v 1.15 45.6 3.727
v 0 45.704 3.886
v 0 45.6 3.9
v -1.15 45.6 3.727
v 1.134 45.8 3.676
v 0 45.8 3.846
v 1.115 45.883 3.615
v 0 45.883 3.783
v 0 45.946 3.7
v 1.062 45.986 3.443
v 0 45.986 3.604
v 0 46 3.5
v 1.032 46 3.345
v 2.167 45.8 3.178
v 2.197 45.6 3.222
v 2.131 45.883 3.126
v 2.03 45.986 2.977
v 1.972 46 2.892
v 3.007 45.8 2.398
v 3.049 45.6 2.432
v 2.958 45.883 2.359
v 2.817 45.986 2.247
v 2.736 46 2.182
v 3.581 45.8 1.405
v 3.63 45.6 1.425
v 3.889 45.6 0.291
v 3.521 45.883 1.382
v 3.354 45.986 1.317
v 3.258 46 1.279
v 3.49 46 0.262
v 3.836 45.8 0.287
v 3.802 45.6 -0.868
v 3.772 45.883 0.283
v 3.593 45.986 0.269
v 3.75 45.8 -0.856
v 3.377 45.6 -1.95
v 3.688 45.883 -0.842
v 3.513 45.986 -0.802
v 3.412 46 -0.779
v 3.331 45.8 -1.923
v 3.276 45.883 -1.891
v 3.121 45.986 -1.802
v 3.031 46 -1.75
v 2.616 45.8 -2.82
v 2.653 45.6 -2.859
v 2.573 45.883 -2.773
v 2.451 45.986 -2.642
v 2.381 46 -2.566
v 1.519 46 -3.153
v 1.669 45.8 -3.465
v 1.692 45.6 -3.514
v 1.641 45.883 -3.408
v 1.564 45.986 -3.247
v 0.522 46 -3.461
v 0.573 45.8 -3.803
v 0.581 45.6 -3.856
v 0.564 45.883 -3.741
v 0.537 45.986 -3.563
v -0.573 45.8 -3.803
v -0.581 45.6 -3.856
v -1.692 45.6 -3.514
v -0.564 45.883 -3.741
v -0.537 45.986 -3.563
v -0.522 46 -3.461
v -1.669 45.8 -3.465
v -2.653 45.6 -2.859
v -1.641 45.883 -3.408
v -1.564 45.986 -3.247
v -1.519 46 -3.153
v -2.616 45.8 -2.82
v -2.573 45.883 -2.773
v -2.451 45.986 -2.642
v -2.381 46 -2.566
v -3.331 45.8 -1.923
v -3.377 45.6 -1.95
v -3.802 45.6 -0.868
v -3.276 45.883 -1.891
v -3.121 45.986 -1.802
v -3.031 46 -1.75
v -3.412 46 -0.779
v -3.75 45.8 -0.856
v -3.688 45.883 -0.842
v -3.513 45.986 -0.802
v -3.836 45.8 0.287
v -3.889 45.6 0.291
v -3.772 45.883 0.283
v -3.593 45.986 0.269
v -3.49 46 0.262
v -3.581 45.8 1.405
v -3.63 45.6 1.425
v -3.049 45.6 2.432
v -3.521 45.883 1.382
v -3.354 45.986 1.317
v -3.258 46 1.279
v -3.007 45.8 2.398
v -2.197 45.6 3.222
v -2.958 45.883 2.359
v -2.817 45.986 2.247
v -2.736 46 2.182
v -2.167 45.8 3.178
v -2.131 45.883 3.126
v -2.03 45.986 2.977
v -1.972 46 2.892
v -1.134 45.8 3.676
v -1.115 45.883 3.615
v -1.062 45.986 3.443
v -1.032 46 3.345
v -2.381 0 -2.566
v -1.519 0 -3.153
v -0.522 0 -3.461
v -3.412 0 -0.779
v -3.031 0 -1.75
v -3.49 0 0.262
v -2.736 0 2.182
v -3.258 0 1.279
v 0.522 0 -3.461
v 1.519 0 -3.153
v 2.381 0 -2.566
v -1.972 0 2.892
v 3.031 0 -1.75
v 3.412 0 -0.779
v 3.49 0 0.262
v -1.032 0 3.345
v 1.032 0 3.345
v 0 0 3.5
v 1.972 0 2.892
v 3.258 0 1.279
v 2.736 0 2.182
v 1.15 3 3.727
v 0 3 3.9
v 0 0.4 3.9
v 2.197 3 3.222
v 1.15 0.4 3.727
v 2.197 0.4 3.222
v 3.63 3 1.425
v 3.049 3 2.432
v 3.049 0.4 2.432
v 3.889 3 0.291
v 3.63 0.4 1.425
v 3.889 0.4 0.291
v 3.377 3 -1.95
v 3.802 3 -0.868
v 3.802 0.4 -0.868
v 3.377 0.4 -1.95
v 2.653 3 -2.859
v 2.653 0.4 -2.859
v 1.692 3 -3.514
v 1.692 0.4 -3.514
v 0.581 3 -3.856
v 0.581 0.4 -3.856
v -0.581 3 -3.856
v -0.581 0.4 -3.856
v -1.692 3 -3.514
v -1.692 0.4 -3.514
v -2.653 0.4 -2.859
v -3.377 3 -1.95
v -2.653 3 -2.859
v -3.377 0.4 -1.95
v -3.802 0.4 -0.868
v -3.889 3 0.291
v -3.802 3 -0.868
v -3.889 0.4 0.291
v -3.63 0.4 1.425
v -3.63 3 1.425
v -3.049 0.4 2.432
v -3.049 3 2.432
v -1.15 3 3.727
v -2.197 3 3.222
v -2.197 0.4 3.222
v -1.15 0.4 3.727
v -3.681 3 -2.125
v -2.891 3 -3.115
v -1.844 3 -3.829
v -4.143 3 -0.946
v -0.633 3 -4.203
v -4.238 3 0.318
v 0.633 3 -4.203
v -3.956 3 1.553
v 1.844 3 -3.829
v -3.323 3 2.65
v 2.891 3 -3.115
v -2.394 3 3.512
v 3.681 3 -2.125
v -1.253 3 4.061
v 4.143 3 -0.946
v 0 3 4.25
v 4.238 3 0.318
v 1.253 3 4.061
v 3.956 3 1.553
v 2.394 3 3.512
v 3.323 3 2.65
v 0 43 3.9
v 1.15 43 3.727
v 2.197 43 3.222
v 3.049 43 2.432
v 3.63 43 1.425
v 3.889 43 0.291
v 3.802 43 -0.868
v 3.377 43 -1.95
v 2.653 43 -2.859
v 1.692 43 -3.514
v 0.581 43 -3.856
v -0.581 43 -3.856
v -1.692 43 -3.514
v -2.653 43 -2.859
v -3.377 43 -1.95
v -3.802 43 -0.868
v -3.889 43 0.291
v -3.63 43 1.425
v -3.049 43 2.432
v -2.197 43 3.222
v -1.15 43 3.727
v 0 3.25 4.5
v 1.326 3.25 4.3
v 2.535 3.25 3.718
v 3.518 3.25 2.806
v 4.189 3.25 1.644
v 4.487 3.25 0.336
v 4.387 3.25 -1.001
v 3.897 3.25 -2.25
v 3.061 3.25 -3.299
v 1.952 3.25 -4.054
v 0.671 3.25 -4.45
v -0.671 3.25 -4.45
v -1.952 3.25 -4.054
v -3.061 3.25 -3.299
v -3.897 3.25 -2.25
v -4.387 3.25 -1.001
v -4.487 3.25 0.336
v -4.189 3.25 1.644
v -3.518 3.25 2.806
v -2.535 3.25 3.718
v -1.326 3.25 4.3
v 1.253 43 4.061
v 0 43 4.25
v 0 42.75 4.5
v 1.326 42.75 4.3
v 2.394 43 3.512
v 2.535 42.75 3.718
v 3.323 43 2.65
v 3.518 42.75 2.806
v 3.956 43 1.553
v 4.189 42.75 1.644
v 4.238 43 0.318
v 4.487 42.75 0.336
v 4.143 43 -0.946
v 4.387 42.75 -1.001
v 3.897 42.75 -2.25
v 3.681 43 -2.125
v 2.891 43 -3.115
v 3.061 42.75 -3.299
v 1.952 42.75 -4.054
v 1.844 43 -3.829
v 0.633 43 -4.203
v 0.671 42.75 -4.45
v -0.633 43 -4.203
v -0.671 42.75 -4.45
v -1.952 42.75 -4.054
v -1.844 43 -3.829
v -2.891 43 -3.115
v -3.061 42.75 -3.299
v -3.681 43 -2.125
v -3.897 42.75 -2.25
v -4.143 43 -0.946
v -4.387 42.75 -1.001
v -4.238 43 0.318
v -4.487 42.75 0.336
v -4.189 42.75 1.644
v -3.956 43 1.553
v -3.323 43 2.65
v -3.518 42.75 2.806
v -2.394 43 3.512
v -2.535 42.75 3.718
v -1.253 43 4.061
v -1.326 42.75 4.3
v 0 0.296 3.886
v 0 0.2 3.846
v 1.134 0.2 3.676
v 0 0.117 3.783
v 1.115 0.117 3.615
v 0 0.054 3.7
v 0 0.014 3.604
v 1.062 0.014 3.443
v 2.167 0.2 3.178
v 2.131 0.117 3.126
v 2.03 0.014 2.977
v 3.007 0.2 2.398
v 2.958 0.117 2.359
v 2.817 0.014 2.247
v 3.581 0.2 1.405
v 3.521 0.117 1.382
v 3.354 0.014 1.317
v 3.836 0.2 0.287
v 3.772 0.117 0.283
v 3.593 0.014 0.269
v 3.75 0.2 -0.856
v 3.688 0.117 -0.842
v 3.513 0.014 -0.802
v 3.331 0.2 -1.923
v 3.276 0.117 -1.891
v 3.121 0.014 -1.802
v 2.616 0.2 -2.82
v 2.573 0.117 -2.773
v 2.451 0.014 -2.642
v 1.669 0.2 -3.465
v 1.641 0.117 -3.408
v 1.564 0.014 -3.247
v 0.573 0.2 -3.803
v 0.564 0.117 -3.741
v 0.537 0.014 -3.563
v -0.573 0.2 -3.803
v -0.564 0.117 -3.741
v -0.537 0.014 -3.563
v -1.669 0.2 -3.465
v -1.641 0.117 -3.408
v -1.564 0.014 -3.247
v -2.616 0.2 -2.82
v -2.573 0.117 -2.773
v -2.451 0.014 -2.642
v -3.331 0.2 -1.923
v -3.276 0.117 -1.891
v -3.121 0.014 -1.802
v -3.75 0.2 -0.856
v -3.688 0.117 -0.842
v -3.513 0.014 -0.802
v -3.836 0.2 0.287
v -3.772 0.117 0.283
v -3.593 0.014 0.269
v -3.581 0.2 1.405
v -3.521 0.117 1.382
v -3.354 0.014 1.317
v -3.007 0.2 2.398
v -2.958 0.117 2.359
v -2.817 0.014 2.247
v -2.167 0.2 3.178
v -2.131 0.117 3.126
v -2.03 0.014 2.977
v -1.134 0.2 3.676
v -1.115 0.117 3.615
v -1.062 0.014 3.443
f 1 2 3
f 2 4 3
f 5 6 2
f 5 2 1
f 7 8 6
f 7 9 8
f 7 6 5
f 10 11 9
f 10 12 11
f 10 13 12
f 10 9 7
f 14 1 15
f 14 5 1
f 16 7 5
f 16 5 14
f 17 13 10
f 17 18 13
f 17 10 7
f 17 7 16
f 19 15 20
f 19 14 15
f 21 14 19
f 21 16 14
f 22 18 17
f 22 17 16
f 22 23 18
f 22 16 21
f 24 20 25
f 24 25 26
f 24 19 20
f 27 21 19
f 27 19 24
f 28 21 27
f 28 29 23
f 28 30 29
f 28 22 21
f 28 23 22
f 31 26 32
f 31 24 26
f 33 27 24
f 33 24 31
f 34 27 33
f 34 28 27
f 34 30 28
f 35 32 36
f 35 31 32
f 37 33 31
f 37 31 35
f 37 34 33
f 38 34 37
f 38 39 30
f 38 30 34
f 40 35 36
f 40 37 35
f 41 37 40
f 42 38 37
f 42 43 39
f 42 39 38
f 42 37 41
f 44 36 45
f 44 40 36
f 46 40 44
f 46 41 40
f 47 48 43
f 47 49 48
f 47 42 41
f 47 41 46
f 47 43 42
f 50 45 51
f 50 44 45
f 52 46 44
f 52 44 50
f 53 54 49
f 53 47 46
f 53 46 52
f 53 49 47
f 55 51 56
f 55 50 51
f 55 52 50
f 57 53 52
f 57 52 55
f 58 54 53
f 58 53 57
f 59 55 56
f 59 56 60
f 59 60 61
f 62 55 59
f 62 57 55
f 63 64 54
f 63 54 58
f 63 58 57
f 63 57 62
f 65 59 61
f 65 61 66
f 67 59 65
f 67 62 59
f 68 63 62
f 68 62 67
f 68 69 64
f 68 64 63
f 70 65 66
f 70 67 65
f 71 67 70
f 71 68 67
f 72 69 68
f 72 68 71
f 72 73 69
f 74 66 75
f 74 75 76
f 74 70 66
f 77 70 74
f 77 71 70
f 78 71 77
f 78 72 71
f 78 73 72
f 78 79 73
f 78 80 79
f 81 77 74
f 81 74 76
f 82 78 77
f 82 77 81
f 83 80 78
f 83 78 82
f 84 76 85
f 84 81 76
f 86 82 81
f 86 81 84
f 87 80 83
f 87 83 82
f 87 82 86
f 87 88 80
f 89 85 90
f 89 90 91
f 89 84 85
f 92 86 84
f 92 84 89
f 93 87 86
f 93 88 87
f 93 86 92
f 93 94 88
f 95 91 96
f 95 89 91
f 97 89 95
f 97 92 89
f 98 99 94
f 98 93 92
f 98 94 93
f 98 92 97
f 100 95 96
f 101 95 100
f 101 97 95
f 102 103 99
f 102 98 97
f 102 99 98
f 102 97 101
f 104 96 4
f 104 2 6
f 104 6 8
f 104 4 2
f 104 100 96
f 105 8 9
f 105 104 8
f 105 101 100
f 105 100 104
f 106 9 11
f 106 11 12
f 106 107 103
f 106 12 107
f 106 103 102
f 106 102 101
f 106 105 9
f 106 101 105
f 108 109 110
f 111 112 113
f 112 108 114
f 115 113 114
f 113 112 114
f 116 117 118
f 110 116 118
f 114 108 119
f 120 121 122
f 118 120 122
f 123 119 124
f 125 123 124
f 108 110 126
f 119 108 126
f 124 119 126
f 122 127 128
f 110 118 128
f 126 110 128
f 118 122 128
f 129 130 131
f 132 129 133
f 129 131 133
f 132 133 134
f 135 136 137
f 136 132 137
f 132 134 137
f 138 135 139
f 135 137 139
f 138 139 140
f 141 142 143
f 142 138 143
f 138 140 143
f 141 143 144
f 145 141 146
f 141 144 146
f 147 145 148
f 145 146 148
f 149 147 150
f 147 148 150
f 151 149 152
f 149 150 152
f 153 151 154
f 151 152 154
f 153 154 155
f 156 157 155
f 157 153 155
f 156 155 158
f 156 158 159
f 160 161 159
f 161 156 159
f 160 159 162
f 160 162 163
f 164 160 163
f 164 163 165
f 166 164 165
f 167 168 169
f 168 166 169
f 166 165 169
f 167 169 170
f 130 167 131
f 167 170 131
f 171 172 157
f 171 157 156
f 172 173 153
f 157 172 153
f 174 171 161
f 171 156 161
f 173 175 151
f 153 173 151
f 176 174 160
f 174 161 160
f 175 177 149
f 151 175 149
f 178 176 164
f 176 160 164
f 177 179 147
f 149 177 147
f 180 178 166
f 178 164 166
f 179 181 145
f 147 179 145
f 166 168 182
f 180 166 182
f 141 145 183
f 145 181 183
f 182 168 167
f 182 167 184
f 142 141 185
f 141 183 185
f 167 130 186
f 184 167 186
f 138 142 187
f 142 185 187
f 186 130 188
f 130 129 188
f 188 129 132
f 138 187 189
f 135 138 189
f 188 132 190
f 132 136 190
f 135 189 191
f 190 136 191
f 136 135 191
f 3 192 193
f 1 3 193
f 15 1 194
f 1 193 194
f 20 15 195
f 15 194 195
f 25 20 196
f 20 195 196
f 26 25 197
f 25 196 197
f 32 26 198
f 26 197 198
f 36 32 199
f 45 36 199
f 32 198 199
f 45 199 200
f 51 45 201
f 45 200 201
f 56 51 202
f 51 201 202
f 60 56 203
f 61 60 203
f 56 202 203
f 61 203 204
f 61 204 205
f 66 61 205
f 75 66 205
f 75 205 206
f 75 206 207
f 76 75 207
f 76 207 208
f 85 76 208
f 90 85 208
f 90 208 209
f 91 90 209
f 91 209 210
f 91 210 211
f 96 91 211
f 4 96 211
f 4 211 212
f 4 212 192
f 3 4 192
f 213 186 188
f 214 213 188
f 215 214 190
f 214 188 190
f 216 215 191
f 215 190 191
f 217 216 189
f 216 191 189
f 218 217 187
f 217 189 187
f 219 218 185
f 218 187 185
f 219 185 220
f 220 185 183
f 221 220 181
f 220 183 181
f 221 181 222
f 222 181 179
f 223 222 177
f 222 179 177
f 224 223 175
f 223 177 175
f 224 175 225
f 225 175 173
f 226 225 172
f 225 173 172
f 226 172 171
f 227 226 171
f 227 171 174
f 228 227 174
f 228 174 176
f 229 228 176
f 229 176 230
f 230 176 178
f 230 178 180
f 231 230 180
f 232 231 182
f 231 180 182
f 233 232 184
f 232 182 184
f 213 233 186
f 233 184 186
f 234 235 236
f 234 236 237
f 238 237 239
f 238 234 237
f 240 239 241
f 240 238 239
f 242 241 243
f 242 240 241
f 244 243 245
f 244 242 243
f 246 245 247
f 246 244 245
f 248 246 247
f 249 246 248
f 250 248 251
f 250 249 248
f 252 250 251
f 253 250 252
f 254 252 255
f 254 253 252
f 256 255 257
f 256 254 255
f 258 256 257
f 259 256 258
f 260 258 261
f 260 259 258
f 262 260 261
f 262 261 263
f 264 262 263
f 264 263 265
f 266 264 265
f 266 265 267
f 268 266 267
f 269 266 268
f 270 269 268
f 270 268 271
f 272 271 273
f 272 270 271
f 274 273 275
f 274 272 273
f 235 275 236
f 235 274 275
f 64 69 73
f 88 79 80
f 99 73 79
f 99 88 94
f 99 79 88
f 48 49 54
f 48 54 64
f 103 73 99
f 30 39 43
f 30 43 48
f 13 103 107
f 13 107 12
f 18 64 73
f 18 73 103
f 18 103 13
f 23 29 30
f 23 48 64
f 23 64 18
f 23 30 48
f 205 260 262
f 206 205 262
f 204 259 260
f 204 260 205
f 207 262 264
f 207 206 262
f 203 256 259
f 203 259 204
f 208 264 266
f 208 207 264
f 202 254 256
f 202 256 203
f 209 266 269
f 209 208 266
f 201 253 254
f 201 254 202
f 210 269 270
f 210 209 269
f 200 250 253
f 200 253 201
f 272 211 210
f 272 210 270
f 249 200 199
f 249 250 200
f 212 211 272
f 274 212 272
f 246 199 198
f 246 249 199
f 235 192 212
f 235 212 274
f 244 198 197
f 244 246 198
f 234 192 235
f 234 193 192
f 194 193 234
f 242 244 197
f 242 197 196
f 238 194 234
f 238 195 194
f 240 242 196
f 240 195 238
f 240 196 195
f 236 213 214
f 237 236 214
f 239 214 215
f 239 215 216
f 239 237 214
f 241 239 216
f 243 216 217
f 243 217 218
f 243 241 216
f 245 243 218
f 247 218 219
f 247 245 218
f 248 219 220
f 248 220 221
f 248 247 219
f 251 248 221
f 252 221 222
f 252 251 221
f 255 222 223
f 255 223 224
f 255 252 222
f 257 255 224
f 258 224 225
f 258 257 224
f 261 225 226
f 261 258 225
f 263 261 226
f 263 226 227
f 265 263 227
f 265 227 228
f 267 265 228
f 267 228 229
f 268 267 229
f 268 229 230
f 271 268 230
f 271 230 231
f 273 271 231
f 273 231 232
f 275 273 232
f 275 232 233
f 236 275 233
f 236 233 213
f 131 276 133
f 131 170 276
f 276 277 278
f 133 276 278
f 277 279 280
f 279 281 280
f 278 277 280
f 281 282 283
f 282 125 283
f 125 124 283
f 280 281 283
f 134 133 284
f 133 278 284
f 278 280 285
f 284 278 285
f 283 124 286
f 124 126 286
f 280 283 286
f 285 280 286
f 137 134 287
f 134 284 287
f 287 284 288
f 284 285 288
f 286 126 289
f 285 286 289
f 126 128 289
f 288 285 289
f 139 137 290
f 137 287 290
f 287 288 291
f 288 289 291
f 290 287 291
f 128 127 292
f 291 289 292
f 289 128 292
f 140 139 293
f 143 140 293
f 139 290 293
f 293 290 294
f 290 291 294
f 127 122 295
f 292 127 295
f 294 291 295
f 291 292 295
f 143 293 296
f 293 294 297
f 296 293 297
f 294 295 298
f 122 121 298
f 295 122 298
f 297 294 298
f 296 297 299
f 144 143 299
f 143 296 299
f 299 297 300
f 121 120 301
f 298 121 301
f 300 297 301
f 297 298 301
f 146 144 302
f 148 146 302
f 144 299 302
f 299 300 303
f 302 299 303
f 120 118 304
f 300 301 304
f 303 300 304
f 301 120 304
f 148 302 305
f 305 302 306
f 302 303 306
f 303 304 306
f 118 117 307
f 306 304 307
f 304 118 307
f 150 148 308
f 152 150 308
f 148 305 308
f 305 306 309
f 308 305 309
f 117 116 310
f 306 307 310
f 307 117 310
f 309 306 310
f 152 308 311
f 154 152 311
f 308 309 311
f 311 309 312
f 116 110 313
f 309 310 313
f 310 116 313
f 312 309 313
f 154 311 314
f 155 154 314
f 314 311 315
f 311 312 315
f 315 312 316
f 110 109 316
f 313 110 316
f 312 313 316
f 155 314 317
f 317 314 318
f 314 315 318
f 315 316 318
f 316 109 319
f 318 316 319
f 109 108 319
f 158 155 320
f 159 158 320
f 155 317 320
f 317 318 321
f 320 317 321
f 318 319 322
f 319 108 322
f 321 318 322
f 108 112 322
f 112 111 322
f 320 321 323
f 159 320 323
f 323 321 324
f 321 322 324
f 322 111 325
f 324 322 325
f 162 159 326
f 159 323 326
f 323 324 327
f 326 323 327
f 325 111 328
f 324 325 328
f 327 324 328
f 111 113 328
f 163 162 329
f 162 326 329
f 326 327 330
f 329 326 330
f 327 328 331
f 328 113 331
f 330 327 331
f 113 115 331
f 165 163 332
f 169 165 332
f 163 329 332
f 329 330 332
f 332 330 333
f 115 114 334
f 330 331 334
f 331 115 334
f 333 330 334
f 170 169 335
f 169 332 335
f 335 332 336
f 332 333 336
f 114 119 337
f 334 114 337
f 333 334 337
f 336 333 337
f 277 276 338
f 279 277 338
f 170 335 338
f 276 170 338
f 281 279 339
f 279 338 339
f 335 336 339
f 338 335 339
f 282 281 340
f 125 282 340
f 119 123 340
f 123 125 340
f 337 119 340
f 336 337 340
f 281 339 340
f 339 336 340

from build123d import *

# Parameters (mm, degrees)
SKETCH1_R           = 3.9
BOSS_EXTRUDE1_DEPTH = 46
FILLET5_R           = 0.4
SKETCH2_R           = 4.5
BOSS_EXTRUDE2_DEPTH = 20
CHAMFER1_SIZE       = 0.25


with BuildPart() as part:
    # Sketch1 → Boss-Extrude1 (new body)
    with BuildSketch(Plane(origin=(0, 0, 0), x_dir=(1, 0, 0), z_dir=(0, 1, 0))):
        with Locations(Location((0, 0, 0), (0, 0, 270))):
            Circle(SKETCH1_R)
    extrude(amount=BOSS_EXTRUDE1_DEPTH)

    # Fillet5
    fillet5_edges = [part.edges().sort_by_distance(p)[0] for p in [
        (0, 0, -3.9),
        (0, 46, -3.9),
    ]]
    fillet(fillet5_edges, radius=FILLET5_R)

    # Sketch2 → Boss-Extrude2 (add, symmetric)
    with BuildSketch(Plane(origin=(0, 23, 0), x_dir=(1, 0, 0), z_dir=(0, 1, 0))):
        with Locations(Location((0, 0, 0), (0, 0, 270))):
            Circle(SKETCH2_R)
    extrude(amount=BOSS_EXTRUDE2_DEPTH, both=True)

    # Chamfer1
    chamfer1_edges = [part.edges().sort_by_distance(p)[0] for p in [
        (0, 3, -4.5),
        (0, 43, -4.5),
    ]]
    chamfer(chamfer1_edges, length=CHAMFER1_SIZE)


solid = part.part
